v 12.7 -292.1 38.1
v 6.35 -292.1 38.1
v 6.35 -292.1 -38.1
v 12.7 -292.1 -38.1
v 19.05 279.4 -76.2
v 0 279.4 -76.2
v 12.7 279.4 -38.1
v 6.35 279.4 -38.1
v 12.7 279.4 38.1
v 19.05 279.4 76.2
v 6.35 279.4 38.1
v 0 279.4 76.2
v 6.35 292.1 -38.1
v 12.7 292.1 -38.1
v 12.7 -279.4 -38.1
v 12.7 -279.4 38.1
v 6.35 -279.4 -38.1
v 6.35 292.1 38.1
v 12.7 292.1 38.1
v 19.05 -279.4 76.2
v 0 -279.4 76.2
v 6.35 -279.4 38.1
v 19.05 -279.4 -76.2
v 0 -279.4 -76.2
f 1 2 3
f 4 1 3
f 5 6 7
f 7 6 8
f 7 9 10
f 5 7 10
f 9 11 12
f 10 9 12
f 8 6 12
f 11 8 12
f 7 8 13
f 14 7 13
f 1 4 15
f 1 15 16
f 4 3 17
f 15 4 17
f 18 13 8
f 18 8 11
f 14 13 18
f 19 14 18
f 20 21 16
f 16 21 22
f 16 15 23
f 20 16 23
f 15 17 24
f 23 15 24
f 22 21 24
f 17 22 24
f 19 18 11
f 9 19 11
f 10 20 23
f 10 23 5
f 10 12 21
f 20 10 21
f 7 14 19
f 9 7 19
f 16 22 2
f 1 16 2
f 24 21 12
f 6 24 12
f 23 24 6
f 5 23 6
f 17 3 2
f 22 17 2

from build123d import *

# Parameters (mm, degrees)
F1_DEPTH = 19.05
F2_W     = 6.35
F2_H     = 76.2
F3_DEPTH = 12.7
F4_W     = 6.35
F4_H     = 76.2
F5_DEPTH = 12.7


with BuildPart() as f1:
    # F0 (on Right) → F1 (new body)
    with BuildSketch(Plane.YZ):
        Polygon((-279.4, -76.2), (279.4, -76.2), (279.4, -38.1), (292.1, -38.1), (292.1, 38.1), (279.4, 38.1), (279.4, 76.2), (-279.4, 76.2), (-279.4, 38.1), (-292.1, 38.1), (-292.1, -38.1), (-279.4, -38.1), align=None)
    extrude(amount=F1_DEPTH)

    # F2 (on face) → F3 (cut)
    with BuildSketch(Plane.XZ.offset(292.1)):
        with Locations((15.875, 0)):
            Rectangle(F2_W, F2_H)
        with Locations((3.175, 0)):
            Rectangle(F2_W, F2_H)
    extrude(amount=-F3_DEPTH, mode=Mode.SUBTRACT)

    # F4 (on face) → F5 (cut)
    with BuildSketch(Plane(origin=(0, 292.1, 0), x_dir=(-1, 0, 0), z_dir=(0, 1, 0))):
        with Locations((-3.175, 0)):
            Rectangle(F4_W, F4_H)
        with Locations((-15.875, 0)):
            Rectangle(F4_W, F4_H)
    extrude(amount=-F5_DEPTH, mode=Mode.SUBTRACT)


solid = f1.part
